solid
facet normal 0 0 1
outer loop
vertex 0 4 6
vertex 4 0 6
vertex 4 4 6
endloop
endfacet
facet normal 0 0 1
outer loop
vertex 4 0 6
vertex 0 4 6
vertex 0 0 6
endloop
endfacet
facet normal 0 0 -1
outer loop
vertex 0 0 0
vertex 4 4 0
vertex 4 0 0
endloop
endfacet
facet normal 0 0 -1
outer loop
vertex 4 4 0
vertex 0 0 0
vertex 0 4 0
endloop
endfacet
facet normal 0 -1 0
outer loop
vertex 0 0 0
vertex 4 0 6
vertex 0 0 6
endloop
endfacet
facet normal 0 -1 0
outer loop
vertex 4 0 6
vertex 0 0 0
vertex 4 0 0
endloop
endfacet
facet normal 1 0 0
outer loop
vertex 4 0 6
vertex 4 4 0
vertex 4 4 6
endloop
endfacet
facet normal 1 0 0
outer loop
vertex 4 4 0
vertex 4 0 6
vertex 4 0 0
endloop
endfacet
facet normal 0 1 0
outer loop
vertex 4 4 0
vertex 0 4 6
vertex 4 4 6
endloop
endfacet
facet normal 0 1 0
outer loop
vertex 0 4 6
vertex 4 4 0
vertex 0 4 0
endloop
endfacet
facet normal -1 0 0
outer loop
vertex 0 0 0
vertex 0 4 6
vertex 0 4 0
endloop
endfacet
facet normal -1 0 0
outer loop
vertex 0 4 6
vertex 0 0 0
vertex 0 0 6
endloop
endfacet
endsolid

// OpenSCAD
//=============================================================================
// Icon used for the ShowBuildVolume button.
// =============================================================================

cube([4, 4, 6]);
